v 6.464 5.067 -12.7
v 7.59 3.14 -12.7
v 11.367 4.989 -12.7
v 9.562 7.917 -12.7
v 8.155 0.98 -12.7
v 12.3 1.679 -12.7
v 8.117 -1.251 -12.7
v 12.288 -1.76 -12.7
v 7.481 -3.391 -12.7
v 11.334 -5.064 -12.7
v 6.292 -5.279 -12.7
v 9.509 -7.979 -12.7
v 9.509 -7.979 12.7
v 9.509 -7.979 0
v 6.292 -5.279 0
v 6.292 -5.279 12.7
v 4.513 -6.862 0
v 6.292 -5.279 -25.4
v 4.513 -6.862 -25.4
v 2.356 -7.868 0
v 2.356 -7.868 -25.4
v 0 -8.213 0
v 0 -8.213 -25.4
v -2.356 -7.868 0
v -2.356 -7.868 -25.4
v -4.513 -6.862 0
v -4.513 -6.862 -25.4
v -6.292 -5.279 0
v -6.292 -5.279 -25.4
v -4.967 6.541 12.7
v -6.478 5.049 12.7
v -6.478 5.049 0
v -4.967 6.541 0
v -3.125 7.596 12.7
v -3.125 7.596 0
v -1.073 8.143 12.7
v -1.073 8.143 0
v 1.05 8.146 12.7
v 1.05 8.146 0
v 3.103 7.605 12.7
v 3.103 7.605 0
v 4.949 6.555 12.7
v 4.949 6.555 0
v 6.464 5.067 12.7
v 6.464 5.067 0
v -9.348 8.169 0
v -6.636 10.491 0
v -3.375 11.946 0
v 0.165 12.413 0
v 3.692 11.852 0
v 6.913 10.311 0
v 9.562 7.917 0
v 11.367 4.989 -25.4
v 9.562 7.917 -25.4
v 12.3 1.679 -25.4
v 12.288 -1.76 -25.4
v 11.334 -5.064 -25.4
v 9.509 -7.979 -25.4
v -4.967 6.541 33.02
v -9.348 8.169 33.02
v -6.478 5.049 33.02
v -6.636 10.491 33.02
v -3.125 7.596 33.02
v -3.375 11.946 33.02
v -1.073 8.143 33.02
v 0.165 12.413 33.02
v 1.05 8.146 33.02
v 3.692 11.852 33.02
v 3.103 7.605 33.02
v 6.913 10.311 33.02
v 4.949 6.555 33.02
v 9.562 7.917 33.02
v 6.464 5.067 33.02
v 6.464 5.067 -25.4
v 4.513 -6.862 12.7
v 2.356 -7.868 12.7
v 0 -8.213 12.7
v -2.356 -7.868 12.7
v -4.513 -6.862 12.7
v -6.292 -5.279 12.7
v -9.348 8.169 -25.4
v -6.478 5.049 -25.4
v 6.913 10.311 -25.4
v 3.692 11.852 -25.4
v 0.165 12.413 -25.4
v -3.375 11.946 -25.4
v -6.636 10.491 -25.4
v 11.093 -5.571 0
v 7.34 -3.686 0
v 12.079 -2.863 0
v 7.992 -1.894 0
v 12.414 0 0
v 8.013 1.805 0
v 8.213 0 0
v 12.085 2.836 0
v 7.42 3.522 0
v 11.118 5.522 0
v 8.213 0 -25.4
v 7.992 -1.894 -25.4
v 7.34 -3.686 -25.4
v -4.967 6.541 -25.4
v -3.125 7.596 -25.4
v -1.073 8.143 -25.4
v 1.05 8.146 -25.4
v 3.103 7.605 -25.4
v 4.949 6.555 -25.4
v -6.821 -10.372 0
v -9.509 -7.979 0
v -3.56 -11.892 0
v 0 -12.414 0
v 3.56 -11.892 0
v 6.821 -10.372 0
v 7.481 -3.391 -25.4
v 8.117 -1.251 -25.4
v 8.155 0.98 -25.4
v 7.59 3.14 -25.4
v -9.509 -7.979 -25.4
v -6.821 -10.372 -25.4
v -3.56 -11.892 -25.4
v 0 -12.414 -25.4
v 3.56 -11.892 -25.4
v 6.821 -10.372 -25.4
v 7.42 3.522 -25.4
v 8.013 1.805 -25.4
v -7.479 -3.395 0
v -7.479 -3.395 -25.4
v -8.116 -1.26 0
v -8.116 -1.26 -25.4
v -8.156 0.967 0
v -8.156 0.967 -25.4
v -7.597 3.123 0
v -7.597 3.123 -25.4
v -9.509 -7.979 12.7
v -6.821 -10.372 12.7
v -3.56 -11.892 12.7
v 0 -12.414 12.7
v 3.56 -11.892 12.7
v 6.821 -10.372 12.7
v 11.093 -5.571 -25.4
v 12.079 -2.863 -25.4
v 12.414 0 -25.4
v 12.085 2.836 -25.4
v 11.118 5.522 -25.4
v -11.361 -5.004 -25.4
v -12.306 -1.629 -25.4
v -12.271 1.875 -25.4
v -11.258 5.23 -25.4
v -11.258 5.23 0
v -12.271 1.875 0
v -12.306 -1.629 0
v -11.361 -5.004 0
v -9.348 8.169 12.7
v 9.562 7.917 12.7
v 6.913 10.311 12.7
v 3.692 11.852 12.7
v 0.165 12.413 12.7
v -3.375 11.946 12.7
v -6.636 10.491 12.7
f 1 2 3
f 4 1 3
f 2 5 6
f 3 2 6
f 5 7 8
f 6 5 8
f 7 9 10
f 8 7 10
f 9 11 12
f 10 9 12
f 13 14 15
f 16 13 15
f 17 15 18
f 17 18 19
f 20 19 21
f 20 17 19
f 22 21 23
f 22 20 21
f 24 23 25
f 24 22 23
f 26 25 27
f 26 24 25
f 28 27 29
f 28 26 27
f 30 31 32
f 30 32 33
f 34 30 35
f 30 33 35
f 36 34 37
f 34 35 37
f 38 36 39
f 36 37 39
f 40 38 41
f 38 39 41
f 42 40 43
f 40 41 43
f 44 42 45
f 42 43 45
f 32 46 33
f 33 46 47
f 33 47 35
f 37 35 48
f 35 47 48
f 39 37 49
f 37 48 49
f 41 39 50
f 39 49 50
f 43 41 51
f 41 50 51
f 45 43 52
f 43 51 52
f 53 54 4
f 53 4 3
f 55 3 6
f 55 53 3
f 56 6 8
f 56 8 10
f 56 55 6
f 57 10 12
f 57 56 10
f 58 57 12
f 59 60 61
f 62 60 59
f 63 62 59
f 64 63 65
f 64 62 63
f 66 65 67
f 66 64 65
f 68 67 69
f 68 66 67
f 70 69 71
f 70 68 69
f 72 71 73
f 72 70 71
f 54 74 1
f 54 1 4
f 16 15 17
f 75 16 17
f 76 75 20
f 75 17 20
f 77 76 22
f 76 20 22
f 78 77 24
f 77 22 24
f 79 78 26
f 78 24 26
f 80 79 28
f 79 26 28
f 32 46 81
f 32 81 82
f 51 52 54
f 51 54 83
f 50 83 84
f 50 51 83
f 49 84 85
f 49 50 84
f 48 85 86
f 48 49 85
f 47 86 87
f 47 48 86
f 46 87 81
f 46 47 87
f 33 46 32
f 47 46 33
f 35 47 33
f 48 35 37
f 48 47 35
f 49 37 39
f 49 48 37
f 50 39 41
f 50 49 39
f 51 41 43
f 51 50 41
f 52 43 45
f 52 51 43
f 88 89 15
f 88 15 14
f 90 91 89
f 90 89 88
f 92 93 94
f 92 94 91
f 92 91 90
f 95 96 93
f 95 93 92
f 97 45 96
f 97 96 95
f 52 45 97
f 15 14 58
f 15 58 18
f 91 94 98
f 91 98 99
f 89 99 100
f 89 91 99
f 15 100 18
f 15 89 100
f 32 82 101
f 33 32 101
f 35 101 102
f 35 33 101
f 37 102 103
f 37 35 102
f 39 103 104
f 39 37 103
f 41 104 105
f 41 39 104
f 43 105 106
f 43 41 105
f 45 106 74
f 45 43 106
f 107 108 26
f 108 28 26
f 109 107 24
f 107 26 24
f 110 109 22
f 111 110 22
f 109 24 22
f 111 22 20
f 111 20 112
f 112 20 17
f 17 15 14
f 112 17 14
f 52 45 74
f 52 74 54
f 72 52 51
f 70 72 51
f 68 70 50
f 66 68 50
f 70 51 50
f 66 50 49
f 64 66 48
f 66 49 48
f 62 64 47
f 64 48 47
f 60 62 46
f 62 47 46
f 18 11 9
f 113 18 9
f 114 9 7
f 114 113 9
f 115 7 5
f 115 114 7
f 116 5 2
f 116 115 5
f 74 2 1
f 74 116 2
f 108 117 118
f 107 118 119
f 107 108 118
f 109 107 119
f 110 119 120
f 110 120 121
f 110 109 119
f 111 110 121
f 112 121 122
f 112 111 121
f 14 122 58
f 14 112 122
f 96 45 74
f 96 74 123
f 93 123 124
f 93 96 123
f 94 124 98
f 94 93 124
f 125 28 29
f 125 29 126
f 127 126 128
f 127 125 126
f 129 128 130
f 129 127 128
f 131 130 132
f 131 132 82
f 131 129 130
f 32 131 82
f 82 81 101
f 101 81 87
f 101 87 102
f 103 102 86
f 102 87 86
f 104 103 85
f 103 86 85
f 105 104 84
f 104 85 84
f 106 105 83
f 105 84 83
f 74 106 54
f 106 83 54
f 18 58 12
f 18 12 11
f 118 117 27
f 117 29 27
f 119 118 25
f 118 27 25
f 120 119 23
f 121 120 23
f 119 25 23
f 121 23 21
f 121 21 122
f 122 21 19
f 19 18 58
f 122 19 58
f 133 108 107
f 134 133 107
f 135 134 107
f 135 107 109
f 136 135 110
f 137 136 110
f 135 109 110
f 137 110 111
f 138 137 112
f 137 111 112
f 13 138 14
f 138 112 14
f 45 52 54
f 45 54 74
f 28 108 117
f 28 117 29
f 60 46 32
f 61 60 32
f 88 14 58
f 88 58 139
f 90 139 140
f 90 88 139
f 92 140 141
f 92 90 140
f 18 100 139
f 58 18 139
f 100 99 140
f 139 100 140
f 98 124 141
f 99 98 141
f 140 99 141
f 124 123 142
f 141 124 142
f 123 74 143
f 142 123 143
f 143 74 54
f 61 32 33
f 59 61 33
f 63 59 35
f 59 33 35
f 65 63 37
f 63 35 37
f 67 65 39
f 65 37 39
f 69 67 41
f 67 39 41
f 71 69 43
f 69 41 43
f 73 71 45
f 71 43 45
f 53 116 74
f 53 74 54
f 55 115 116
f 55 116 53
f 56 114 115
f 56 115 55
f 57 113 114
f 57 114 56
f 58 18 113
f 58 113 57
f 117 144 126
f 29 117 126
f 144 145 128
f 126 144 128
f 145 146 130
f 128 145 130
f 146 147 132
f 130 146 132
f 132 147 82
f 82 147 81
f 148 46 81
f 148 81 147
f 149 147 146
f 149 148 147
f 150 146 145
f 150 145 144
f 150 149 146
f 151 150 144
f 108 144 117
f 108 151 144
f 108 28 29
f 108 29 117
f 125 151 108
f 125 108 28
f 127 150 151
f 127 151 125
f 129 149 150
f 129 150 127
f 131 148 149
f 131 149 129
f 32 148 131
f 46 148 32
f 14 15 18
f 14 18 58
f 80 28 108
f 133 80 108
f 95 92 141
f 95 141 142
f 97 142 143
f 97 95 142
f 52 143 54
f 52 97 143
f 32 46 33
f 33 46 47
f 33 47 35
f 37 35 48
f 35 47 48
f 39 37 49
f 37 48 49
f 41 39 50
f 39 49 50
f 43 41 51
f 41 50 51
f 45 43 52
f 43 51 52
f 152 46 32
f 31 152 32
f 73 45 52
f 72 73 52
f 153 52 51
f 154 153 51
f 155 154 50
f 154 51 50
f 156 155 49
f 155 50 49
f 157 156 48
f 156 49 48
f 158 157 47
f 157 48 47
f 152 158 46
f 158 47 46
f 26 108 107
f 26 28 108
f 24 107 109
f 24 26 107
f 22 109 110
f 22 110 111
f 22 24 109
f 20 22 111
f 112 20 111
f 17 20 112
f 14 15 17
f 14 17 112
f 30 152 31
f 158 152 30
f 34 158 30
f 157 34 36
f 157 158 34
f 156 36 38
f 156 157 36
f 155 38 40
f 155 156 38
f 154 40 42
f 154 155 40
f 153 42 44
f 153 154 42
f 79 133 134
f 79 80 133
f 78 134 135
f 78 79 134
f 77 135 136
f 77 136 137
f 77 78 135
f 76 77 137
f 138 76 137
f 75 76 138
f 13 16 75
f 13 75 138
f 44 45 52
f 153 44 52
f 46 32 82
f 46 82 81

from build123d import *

# Parameters (mm, degrees)
F1_DEPTH = 25.4
F2_DEPTH = 12.7
F3_DEPTH = 33.02
F4_DEPTH = 25.4


with BuildPart() as f1:
    # F0 (on Top) → F1 (new body)
    with BuildSketch(Plane.XY):
        with BuildLine():
            Line((-6.4782422297, 5.0489418333), (-9.3475677746, 8.1685170208))
            ThreePointArc((-9.3475677746, 8.1685170208), (-12.4131461964, 0.1244794215), (-9.5094997737, -7.9794177528))
            Line((-9.5094997737, -7.9794177528), (-6.2918059472, -5.2794520497))
            ThreePointArc((-6.2918059472, -5.2794520497), (-8.2120315794, -0.1482341453), (-6.4782422297, 5.0489418333))
        make_face()
    extrude(amount=-F1_DEPTH)


with BuildPart() as f1b:
    # F0 (on Top) → F1, piece 2 (new body)
    with BuildSketch(Plane.XY):
        with BuildLine():
            ThreePointArc((9.5094997737, -7.9794177528), (11.6651283682, -4.2457595049), (12.4137703225, 0))
            ThreePointArc((12.4137703225, 0), (11.67907164, 4.2072531714), (9.5619406546, 7.9165007761))
            Line((9.5619406546, 7.9165007761), (6.4640403816, 5.0671114027))
            ThreePointArc((6.4640403816, 5.0671114027), (7.7637293599, 2.6802877548), (8.2133693465, 0))
            ThreePointArc((8.2133693465, 0), (7.7180425667, -2.8091377611), (6.2918059472, -5.2794520497))
            Line((6.2918059472, -5.2794520497), (9.5094997737, -7.9794177528))
        make_face()
    extrude(amount=-F1_DEPTH)


with BuildPart() as f2:
    # F0 (on Top) + F1_face (on face) → F2 (new body)
    with BuildSketch(Plane.XY):
        with BuildLine():
            ThreePointArc((-9.5094997737, -7.9794177528), (0, -12.4137703225), (9.5094997737, -7.9794177528))
            Line((9.5094997737, -7.9794177528), (6.2918059472, -5.2794520497))
            ThreePointArc((6.2918059472, -5.2794520497), (0, -8.2133693465), (-6.2918059472, -5.2794520497))
            Line((-6.2918059472, -5.2794520497), (-9.5094997737, -7.9794177528))
        make_face()
        with BuildLine():
            Line((6.4640403816, 5.0671114027), (9.5619406546, 7.9165007761))
            ThreePointArc((9.5619406546, 7.9165007761), (0.1654296824, 12.4126679904), (-9.3475677746, 8.1685170208))
            Line((-9.3475677746, 8.1685170208), (-6.4782422297, 5.0489418333))
            ThreePointArc((-6.4782422297, 5.0489418333), (-0.0115306737, 8.2133612526), (6.4640403816, 5.0671114027))
        make_face()
    with BuildSketch(Plane(origin=(9.6516208653, -0.0788264045, -25.4), x_dir=(1, 0, 0), z_dir=(0, 0, -1))):
        with BuildLine():
            Line((-0.1421210916, 7.9005913483), (-3.3598149181, 5.2006256452))
            ThreePointArc((-3.3598149181, 5.2006256452), (-1.439389274, 0.0578787992), (-3.1875804837, -5.1459378071))
            Line((-3.1875804837, -5.1459378071), (-0.0896802107, -7.9953271806))
            ThreePointArc((-0.0896802107, -7.9953271806), (2.7620819051, -0.0378734072), (-0.1421210916, 7.9005913483))
        make_face()
    extrude(amount=F2_DEPTH, dir=(0, 0, 1))


with BuildPart() as f3:
    # F0 (on Top) → F3 (new body)
    with BuildSketch(Plane.XY):
        with BuildLine():
            Line((6.4640403816, 5.0671114027), (9.5619406546, 7.9165007761))
            ThreePointArc((9.5619406546, 7.9165007761), (0.1654296824, 12.4126679904), (-9.3475677746, 8.1685170208))
            Line((-9.3475677746, 8.1685170208), (-6.4782422297, 5.0489418333))
            ThreePointArc((-6.4782422297, 5.0489418333), (-0.0115306737, 8.2133612526), (6.4640403816, 5.0671114027))
        make_face()
    extrude(amount=F3_DEPTH)


with BuildPart() as f4:
    # F0 (on Top) → F4 (new body)
    with BuildSketch(Plane.XY):
        with BuildLine():
            ThreePointArc((-9.5094997737, -7.9794177528), (0, -12.4137703225), (9.5094997737, -7.9794177528))
            Line((9.5094997737, -7.9794177528), (6.2918059472, -5.2794520497))
            ThreePointArc((6.2918059472, -5.2794520497), (0, -8.2133693465), (-6.2918059472, -5.2794520497))
            Line((-6.2918059472, -5.2794520497), (-9.5094997737, -7.9794177528))
        make_face()
    extrude(amount=-F4_DEPTH)


with BuildPart() as f4b:
    # F0 (on Top) → F4, piece 2 (new body)
    with BuildSketch(Plane.XY):
        with BuildLine():
            Line((6.4640403816, 5.0671114027), (9.5619406546, 7.9165007761))
            ThreePointArc((9.5619406546, 7.9165007761), (0.1654296824, 12.4126679904), (-9.3475677746, 8.1685170208))
            Line((-9.3475677746, 8.1685170208), (-6.4782422297, 5.0489418333))
            ThreePointArc((-6.4782422297, 5.0489418333), (-0.0115306737, 8.2133612526), (6.4640403816, 5.0671114027))
        make_face()
    extrude(amount=-F4_DEPTH)


solid = Compound([f1.part, f1b.part, f2.part, f3.part, f4.part, f4b.part])
